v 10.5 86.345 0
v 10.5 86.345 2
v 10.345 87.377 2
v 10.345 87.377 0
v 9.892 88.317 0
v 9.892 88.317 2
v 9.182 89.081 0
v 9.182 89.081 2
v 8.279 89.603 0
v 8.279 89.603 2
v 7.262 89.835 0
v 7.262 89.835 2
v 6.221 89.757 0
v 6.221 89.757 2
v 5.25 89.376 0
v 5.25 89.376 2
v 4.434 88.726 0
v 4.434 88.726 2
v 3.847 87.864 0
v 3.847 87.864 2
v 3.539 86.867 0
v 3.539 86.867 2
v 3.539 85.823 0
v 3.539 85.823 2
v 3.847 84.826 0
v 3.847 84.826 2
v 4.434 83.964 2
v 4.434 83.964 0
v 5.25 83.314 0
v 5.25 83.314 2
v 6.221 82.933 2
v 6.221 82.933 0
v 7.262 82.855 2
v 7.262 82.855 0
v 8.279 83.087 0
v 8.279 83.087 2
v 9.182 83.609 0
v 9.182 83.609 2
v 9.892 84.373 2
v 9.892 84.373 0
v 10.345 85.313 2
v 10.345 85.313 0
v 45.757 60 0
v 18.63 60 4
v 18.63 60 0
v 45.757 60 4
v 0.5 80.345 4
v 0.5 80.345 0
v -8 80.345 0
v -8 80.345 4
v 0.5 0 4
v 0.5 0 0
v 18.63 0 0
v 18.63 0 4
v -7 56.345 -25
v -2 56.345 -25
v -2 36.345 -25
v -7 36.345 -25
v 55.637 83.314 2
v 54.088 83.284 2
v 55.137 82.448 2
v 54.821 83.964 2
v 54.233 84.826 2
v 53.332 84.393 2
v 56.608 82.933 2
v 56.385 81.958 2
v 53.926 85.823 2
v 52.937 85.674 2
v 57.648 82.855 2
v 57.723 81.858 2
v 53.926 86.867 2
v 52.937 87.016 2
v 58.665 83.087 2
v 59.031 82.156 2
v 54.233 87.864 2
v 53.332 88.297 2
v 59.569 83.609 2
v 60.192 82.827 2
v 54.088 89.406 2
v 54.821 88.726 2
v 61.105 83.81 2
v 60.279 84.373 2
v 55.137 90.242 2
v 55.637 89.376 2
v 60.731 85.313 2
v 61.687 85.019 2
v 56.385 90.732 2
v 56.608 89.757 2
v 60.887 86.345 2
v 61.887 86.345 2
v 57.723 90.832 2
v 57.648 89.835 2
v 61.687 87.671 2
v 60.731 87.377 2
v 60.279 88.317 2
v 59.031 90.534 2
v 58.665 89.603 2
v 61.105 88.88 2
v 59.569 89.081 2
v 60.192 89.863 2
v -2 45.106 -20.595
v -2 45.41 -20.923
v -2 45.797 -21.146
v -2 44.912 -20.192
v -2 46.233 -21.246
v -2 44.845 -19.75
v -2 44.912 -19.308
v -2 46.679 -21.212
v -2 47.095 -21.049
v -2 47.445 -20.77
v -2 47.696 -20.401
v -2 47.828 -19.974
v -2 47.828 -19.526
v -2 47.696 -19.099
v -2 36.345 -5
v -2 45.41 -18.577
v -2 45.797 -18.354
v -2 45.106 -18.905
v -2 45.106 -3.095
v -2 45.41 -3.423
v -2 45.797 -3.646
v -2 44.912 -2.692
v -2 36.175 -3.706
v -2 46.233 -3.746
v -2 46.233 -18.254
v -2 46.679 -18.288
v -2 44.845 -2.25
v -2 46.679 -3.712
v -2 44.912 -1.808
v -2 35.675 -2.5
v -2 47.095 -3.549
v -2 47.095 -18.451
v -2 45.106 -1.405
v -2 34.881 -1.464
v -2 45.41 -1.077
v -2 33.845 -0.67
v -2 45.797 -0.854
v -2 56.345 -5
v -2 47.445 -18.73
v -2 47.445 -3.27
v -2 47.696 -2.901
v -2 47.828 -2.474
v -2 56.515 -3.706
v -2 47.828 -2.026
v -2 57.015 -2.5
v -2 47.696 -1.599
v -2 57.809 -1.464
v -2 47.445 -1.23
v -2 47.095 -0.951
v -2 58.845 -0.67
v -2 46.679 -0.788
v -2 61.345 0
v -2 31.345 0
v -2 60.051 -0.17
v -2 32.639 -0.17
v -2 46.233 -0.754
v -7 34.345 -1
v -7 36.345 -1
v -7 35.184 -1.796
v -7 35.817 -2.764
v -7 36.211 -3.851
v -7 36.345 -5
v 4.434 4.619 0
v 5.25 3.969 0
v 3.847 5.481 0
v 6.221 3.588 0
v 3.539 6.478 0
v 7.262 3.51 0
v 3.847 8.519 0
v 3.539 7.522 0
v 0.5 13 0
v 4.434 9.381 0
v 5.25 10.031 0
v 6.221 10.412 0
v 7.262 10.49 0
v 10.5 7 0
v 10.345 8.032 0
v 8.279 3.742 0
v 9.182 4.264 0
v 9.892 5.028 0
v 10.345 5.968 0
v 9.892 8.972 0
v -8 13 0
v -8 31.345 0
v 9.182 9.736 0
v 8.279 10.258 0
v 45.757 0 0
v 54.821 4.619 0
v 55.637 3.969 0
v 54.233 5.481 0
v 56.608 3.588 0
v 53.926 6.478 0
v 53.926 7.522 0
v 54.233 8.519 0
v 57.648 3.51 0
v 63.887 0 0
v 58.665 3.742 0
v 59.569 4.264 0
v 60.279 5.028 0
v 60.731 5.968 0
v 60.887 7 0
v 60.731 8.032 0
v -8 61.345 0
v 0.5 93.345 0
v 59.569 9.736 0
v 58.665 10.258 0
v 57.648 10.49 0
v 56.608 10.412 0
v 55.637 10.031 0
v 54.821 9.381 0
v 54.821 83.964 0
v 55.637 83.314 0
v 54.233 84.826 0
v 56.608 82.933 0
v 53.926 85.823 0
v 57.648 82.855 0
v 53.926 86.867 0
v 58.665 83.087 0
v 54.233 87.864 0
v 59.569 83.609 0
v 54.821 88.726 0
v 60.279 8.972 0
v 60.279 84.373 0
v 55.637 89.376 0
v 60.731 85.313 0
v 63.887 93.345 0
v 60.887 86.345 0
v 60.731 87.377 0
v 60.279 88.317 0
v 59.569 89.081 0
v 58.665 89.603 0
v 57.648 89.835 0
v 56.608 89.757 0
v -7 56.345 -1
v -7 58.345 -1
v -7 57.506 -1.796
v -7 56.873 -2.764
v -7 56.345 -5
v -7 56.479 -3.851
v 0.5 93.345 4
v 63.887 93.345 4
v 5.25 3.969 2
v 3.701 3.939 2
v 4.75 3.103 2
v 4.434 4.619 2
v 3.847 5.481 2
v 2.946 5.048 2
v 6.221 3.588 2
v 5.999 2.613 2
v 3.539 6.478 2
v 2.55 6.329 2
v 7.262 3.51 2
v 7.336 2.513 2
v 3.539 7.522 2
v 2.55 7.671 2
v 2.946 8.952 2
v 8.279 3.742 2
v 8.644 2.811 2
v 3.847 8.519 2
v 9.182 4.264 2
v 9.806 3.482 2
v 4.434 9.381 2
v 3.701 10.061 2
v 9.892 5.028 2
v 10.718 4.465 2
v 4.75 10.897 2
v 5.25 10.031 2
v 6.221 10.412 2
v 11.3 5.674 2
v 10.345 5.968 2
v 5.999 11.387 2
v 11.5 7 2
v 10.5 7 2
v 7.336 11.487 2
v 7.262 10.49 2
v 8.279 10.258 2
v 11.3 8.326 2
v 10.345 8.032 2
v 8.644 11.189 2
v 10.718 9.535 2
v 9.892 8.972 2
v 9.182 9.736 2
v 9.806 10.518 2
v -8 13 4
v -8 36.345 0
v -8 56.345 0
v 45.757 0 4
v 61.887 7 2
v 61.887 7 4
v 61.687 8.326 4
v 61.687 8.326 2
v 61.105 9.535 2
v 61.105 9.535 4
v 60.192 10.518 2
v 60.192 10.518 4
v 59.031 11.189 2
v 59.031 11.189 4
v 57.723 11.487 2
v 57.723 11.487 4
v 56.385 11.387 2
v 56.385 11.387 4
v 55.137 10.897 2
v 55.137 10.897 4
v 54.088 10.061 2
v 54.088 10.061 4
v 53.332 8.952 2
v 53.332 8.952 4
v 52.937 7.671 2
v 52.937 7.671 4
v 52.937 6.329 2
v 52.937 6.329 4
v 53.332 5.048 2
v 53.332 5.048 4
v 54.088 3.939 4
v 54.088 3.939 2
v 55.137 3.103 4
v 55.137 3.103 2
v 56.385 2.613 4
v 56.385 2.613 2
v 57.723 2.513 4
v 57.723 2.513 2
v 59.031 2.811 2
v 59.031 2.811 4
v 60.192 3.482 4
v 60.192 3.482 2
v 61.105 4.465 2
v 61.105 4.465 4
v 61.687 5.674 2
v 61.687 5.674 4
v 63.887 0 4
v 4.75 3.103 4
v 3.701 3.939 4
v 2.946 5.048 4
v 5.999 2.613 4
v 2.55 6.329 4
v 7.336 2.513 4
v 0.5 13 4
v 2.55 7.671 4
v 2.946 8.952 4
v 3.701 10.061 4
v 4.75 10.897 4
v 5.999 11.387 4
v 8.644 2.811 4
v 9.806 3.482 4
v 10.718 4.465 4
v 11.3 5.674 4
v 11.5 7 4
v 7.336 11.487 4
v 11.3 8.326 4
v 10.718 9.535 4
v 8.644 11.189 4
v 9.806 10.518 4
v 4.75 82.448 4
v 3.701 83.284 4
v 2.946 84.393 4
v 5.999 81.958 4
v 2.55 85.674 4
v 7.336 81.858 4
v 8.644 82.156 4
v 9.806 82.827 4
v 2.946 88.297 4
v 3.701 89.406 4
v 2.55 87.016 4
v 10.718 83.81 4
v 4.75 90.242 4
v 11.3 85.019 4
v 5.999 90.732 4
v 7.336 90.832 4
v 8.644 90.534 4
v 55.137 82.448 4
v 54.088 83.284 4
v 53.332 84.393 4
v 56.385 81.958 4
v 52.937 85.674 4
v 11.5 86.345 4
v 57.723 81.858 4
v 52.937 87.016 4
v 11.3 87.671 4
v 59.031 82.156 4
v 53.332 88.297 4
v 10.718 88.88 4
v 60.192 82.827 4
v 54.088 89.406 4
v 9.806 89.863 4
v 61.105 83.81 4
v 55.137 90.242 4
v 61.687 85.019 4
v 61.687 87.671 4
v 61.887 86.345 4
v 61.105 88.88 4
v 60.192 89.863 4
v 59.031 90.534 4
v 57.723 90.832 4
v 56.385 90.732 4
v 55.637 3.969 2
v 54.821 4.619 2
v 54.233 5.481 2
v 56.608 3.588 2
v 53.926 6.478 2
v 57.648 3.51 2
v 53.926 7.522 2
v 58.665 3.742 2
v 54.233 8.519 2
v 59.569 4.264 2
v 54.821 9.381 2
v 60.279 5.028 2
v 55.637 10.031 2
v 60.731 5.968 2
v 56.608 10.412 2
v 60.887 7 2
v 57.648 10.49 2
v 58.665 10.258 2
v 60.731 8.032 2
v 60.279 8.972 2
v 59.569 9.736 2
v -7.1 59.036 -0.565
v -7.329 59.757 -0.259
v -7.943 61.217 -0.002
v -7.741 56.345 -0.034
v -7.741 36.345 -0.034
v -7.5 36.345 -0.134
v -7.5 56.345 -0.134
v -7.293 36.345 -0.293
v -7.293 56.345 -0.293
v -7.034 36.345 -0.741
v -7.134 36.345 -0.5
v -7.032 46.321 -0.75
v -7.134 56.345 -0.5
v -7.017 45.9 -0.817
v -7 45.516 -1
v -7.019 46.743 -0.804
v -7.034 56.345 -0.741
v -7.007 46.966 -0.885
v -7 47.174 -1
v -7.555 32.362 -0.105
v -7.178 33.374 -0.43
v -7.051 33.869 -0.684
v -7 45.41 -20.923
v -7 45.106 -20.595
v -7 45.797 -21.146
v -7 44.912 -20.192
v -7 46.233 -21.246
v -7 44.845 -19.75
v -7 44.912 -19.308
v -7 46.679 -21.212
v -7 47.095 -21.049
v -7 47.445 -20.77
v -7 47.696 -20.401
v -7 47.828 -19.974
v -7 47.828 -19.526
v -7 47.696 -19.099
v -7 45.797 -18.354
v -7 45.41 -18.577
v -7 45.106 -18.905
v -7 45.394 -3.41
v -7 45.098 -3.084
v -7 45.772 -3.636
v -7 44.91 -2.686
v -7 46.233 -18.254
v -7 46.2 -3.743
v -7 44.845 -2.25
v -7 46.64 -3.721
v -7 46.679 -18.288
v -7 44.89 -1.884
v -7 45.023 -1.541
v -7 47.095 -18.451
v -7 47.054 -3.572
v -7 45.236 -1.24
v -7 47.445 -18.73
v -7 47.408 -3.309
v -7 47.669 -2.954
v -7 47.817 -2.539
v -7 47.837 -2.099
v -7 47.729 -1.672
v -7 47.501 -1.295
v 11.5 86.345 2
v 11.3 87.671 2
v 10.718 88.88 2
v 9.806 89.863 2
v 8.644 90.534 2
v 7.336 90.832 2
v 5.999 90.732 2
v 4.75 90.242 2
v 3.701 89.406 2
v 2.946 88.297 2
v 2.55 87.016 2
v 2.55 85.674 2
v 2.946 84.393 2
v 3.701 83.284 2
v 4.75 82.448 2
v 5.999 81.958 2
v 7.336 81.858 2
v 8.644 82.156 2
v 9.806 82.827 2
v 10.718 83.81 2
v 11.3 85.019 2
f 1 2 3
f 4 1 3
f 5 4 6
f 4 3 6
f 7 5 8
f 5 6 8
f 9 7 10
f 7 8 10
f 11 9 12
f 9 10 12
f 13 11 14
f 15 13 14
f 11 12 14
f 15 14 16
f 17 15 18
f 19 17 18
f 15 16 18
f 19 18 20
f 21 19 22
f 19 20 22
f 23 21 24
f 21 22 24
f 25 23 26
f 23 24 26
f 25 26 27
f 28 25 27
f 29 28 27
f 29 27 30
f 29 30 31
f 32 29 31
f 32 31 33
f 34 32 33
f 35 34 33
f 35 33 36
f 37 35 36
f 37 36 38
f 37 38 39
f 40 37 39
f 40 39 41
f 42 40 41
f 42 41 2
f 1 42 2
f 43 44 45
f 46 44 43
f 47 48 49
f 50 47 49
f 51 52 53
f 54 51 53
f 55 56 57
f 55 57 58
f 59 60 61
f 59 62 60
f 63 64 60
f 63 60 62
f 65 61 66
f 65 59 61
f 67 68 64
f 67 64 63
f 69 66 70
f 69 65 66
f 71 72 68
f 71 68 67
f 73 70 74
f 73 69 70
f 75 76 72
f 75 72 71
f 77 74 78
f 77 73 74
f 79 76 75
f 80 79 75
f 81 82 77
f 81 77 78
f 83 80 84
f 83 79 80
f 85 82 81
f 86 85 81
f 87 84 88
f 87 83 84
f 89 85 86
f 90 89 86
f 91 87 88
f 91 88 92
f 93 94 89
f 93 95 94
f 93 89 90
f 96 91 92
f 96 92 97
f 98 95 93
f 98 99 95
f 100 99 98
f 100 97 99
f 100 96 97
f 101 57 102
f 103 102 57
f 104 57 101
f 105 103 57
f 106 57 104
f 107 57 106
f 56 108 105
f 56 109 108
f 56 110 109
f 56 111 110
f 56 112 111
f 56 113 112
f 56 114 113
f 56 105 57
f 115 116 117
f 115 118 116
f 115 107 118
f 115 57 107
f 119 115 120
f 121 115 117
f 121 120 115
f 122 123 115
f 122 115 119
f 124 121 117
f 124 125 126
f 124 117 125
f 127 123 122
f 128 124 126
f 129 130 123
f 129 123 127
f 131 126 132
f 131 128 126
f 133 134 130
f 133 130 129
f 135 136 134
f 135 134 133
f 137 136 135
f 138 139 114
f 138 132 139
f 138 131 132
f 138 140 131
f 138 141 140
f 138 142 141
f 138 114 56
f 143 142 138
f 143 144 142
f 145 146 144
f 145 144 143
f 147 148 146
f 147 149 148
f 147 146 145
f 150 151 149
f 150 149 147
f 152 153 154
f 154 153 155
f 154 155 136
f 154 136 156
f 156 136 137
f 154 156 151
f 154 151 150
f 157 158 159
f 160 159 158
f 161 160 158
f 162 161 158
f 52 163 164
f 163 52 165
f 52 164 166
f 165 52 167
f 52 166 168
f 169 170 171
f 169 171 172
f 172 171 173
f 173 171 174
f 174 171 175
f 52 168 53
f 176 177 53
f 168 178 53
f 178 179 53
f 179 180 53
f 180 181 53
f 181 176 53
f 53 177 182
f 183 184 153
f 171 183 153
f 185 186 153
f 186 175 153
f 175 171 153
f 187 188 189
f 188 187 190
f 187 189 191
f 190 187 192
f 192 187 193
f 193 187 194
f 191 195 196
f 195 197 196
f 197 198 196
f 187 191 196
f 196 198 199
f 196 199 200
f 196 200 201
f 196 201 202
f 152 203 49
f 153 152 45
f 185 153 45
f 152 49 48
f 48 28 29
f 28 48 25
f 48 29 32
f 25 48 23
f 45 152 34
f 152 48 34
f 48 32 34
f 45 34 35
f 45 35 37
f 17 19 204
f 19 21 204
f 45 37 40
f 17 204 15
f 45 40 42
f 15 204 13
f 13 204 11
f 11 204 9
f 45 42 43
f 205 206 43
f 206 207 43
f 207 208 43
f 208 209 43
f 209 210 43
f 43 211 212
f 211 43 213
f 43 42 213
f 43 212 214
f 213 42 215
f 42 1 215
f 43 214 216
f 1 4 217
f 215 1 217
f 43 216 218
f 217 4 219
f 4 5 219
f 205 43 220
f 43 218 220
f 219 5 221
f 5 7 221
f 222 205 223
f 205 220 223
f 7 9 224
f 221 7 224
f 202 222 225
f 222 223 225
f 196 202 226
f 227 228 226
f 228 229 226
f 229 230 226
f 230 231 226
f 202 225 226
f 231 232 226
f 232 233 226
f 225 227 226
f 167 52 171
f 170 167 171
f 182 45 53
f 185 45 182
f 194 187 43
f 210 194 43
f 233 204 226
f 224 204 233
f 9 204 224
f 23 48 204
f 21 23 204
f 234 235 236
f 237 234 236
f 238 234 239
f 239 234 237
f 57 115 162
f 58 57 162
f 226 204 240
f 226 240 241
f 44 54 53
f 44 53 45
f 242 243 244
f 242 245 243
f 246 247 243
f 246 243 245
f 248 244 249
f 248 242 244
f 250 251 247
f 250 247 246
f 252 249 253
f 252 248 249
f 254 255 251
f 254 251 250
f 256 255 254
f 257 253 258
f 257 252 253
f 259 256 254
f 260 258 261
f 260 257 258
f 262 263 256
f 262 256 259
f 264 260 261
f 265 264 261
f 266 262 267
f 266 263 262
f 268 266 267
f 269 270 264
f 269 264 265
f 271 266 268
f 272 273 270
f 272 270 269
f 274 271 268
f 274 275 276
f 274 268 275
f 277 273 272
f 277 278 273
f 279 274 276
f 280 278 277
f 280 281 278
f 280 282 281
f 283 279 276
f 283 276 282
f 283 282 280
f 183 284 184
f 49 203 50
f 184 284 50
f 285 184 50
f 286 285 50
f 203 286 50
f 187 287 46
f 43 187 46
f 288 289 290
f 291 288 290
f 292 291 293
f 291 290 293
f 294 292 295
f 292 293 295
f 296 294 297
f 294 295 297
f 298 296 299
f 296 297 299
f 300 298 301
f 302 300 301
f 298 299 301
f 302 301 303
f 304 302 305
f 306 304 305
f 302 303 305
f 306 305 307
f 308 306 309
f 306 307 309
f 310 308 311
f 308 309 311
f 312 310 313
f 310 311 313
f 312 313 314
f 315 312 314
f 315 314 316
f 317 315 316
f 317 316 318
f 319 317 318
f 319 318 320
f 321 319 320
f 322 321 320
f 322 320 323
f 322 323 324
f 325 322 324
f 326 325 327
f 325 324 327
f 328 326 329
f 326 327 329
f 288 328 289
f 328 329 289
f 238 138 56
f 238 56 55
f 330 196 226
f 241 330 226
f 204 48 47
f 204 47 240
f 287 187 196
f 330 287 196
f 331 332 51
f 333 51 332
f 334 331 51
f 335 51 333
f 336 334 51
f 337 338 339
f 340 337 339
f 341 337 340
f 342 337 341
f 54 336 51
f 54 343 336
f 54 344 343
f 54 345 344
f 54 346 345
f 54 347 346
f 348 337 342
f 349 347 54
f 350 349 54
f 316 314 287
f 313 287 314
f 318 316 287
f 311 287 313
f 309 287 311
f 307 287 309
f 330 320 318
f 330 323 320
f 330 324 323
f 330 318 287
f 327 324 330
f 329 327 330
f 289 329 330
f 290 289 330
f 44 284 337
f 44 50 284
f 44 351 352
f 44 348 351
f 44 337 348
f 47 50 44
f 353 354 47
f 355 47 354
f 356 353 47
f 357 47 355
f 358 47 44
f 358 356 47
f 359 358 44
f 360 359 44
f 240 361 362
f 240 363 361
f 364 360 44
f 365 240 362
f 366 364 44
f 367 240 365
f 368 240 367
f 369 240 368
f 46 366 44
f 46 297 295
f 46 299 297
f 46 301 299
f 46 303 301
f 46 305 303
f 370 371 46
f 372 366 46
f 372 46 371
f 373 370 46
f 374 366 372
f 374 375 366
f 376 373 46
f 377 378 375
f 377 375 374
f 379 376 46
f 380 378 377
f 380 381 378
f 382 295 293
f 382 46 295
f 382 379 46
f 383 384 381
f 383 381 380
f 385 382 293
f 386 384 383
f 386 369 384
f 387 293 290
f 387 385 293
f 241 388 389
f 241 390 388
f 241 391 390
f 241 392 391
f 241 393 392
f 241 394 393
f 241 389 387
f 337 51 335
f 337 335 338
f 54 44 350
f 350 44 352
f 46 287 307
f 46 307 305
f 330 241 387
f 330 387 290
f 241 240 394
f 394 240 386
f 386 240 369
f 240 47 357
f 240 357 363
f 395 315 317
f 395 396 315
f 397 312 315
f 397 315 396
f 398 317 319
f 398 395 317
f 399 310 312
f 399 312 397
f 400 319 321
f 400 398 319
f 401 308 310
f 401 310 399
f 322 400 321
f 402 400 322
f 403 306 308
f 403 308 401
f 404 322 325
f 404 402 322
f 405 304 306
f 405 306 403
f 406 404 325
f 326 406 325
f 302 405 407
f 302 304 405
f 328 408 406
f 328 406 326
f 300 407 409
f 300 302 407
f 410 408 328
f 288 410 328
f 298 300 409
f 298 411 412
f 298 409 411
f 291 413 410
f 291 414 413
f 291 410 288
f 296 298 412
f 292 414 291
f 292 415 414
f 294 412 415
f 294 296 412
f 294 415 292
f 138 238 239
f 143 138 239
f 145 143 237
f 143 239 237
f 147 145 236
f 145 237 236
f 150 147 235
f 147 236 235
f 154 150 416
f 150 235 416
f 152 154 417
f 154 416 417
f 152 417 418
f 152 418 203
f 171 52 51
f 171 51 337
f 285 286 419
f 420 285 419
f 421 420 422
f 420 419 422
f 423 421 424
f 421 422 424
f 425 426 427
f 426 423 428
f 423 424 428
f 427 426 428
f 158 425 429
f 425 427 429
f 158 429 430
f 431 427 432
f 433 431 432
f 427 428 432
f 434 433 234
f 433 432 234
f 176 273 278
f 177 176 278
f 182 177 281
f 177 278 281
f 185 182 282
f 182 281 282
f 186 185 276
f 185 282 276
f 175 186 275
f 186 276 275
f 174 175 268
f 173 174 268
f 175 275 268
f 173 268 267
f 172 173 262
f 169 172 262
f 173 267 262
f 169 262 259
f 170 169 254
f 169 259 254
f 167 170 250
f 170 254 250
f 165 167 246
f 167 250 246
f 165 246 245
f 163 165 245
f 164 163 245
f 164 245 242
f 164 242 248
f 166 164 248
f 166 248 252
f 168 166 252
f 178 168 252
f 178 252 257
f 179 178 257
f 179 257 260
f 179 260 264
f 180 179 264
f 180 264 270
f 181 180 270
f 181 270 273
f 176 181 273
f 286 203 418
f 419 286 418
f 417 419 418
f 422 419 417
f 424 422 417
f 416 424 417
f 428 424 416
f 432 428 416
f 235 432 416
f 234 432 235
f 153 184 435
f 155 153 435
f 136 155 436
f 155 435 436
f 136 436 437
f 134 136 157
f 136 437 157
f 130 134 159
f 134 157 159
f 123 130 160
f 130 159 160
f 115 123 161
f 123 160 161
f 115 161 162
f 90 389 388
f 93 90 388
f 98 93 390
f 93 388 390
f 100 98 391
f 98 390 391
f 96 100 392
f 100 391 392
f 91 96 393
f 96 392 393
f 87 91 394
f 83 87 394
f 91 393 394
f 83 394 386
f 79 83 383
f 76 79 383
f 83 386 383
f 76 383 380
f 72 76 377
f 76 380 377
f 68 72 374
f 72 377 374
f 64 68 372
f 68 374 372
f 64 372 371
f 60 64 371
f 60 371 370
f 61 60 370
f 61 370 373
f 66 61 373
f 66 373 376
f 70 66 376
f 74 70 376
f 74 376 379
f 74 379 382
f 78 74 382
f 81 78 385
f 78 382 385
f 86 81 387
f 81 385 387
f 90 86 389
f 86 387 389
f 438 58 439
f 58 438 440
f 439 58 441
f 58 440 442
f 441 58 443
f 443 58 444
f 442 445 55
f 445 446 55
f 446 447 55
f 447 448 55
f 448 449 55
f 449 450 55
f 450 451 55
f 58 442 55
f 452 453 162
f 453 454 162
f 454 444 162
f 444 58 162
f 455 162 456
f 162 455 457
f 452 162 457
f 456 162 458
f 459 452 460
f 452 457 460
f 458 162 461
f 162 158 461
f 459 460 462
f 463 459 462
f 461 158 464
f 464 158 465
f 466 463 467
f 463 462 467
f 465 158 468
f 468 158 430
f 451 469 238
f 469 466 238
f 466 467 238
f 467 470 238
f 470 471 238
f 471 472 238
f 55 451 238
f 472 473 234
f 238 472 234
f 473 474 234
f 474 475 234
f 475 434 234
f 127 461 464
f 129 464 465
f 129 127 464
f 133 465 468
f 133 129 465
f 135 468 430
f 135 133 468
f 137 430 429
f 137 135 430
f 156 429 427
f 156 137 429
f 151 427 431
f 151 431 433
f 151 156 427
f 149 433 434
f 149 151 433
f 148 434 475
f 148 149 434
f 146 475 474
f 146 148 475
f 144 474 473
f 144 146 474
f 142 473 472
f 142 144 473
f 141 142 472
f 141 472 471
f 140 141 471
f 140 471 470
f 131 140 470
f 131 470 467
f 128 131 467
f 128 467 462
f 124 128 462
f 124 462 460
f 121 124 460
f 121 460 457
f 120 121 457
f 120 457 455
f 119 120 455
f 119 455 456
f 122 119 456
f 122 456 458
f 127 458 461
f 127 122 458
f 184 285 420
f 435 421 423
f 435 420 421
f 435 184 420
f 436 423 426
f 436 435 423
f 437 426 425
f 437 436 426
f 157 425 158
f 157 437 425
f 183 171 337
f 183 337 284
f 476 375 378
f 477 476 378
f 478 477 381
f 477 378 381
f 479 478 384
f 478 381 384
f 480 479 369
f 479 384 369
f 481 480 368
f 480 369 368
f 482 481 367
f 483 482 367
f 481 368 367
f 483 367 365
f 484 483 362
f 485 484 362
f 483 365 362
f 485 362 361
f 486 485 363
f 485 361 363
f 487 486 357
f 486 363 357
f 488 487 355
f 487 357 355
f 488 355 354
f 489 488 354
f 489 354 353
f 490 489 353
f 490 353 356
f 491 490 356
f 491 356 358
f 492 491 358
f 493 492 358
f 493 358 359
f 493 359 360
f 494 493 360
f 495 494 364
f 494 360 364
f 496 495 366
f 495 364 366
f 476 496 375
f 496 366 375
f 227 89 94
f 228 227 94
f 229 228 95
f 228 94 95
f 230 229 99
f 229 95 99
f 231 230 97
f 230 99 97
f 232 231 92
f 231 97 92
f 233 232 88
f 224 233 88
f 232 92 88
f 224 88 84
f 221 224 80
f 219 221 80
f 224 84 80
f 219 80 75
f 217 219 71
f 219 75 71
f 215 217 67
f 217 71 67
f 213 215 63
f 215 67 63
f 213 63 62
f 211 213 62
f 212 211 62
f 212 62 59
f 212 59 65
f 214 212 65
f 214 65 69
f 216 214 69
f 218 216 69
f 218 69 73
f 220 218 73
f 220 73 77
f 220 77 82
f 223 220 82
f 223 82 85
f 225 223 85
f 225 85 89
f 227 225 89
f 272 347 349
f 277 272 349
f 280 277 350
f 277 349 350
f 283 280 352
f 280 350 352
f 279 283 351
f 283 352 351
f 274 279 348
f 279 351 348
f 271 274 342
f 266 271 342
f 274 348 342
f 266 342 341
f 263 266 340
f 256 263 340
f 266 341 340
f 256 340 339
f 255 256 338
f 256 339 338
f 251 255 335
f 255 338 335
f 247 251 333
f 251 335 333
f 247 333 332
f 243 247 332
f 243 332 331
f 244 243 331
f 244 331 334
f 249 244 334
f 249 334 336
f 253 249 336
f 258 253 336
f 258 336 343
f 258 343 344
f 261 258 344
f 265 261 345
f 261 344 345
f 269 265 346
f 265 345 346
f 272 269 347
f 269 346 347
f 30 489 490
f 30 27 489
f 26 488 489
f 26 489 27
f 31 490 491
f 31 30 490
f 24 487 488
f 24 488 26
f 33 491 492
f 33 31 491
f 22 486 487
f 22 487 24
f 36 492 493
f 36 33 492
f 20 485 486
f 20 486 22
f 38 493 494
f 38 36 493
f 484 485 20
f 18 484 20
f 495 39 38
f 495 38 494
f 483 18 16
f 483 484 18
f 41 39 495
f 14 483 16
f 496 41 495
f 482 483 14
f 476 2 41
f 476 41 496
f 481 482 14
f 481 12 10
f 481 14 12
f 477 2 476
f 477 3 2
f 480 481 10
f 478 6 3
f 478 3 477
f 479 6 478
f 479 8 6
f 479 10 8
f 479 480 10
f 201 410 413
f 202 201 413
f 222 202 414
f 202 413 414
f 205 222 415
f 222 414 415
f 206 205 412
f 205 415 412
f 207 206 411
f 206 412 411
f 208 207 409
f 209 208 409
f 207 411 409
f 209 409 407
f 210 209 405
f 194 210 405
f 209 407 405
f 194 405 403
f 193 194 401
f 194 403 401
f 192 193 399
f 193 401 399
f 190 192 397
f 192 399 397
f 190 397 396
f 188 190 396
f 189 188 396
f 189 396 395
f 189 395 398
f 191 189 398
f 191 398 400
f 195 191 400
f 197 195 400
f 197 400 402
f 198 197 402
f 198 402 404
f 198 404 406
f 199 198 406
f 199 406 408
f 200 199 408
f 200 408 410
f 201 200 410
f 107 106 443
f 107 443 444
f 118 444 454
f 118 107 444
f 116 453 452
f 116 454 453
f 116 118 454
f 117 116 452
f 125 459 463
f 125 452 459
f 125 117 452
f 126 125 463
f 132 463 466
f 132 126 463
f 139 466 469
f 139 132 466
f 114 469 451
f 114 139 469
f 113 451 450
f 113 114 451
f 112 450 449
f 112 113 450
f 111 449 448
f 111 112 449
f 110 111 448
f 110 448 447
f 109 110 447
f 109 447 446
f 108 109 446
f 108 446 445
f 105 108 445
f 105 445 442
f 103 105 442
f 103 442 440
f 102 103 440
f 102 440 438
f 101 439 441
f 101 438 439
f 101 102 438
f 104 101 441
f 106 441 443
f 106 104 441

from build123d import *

# Parameters (mm, degrees)
CROQUIS1_W                 = 64.38677758
CROQUIS1_H                 = 93.345
SALIENTE_EXTRUIR1_DEPTH    = 4
CROQUIS2_W                 = 27.12677758
CROQUIS2_H                 = 60
CORTAR_EXTRUIR1_DEPTH      = 114.467819897
CROQUIS5_R                 = 4.5
CORTAR_EXTRUIR3_DEPTH      = 2
CROQUIS6_R                 = 3.5
CORTAR_EXTRUIR4_DEPTH      = 114.414929141
CROQUIS7_W                 = 8
CROQUIS7_H                 = 67.345
SALIENTE_EXTRUIR4_DEPTH    = 4
CROQUIS8_W                 = 26.63
CROQUIS8_H                 = 67.345
SALIENTE_EXTRUIR5_DEPTH    = 2
CROQUIS9_W                 = 0.5
CROQUIS9_H                 = 93.345
CROQUIS9_H_2               = 13
CORTAR_EXTRUIR5_DEPTH      = 13
CROQUIS10_W                = 5
CROQUIS10_H                = 20
SALIENTE_EXTRUIR6_DEPTH    = 25
REDONDEO1_R                = 1
REDONDEO2_START            = -8.0000001
REDONDEO2_DEPTH            = 6.0000001
REDONDEO2_START_2          = 13
REDONDEO2_2_DEPTH          = 67.345
CORTAR_EXTRUIR6_DEPTH      = 120.846669794
CORTAR_EXTRUIR6_DEPTH_BACK = 120.846669794
CROQUIS11_R                = 1.5


with BuildPart() as part:
    # Croquis1 → Saliente-Extruir1 (new body)
    with BuildSketch(Plane.XY):
        with Locations((32.19338879, 46.6725)):
            Rectangle(CROQUIS1_W, CROQUIS1_H)
    extrude(amount=SALIENTE_EXTRUIR1_DEPTH)

    # Croquis2 → Cortar-Extruir1 (cut, through all)
    with BuildSketch(Plane.XY.offset(4)):
        with Locations((32.19338879, 30)):
            Rectangle(CROQUIS2_W, CROQUIS2_H)
    extrude(amount=-CORTAR_EXTRUIR1_DEPTH, mode=Mode.SUBTRACT)

    # Croquis5 → Cortar-Extruir3 (cut)
    with BuildSketch(Plane.XY.offset(4)):
        with Locations((57.38677758, 86.345)):
            Circle(CROQUIS5_R)
        with Locations((7, 86.345)):
            Circle(CROQUIS5_R)
        with Locations((57.38677758, 7)):
            Circle(CROQUIS5_R)
        with Locations((7, 7)):
            Circle(CROQUIS5_R)
    extrude(amount=-CORTAR_EXTRUIR3_DEPTH, mode=Mode.SUBTRACT)

    # Croquis6 → Cortar-Extruir4 (cut, through all)
    with BuildSketch(Plane.XY.offset(2)):
        with Locations((7, 86.345)):
            Circle(CROQUIS6_R)
        with Locations((57.38677758, 86.345)):
            Circle(CROQUIS6_R)
        with Locations((57.38677758, 7)):
            Circle(CROQUIS6_R)
        with Locations((7, 7)):
            Circle(CROQUIS6_R)
    extrude(amount=-CORTAR_EXTRUIR4_DEPTH, mode=Mode.SUBTRACT)

    # Croquis7 → Saliente-Extruir4 (add, through all)
    with BuildSketch(Plane(origin=(0, 0, 0), x_dir=(-1, 0, 0), z_dir=(0, 0, -1))):
        with Locations((4, 46.6725)):
            Rectangle(CROQUIS7_W, CROQUIS7_H)
    extrude(amount=-SALIENTE_EXTRUIR4_DEPTH)

    # Croquis8 → Saliente-Extruir5 (add)
    with BuildSketch(Plane(origin=(0, 0, 0), x_dir=(-1, 0, 0), z_dir=(0, 0, -1))):
        with Locations((-5.315, 46.6725)):
            Rectangle(CROQUIS8_W, CROQUIS8_H)
    extrude(amount=-SALIENTE_EXTRUIR5_DEPTH)

    # Croquis9 → Cortar-Extruir5 (cut)
    with BuildSketch(Plane(origin=(0, 0, 0), x_dir=(-1, 0, 0), z_dir=(0, 0, -1))):
        with Locations((-64.13677758, 46.6725)):
            Rectangle(CROQUIS9_W, CROQUIS9_H)
        with Locations((-0.25, 86.845)):
            Rectangle(CROQUIS9_W, CROQUIS9_H_2)
        with Locations((-0.25, 6.5)):
            Rectangle(CROQUIS9_W, CROQUIS9_H_2)
    extrude(amount=-CORTAR_EXTRUIR5_DEPTH, mode=Mode.SUBTRACT)

    # Croquis10 → Saliente-Extruir6 (add)
    with BuildSketch(Plane(origin=(0, 0, 0), x_dir=(-1, 0, 0), z_dir=(0, 0, -1))):
        with Locations((4.5, 46.345)):
            Rectangle(CROQUIS10_W, CROQUIS10_H)
    extrude(amount=SALIENTE_EXTRUIR6_DEPTH)

    # Redondeo1
    redondeo1_edges = [part.edges().sort_by_distance(p)[0] for p in [
        (-7, 46.345, 0),
    ]]
    fillet(redondeo1_edges, radius=REDONDEO1_R - 0.0001)  # a hair under: the kernel refuses the full size

    # Redondeo2: read off the stored shape, not the designer's step
    # Redondeo2 outline → Redondeo2 (add)
    with BuildSketch(Plane.YZ.offset(REDONDEO2_START)):
        with BuildLine():
            Line((56.345, 0), (56.345, -5))
            ThreePointArc((56.345, -5), (57.809466094, -1.464466094), (61.345, 0))
            Line((61.345, 0), (56.345, 0))
        make_face()
        with BuildLine():
            Line((36.345, -5), (36.345, 0))
            Line((36.345, 0), (31.345, 0))
            ThreePointArc((31.345, 0), (34.880533906, -1.464466094), (36.345, -5))
        make_face()
    extrude(amount=REDONDEO2_DEPTH)

    # Redondeo2 2 outline → Redondeo2 2 (cut)
    with BuildSketch(Plane(origin=(0, 0, 0), x_dir=(1, 0, 0), z_dir=(0, 1, 0)).offset(REDONDEO2_START_2)):
        with BuildLine():
            ThreePointArc((-8, 0), (-7.292893219, 0.292893219), (-7, 1))
            Line((-7, 1), (-6.999999997, 6))
            Line((-6.999999997, 6), (-8, 6))
            Line((-8, 6), (-8, 0))
        make_face()
    extrude(amount=REDONDEO2_2_DEPTH, mode=Mode.SUBTRACT)

    # Croquis11 → Cortar-Extruir6 (cut, two sides: drawn at the far end of the back side and taken through both)
    with BuildSketch(Plane.ZY.offset(7).offset(-CORTAR_EXTRUIR6_DEPTH_BACK)):
        with Locations(Location((-19.75, 46.345, 0), (0, 0, 270))):
            Circle(CROQUIS11_R)
        with Locations(Location((-2.25, 46.345, 0), (0, 0, 270))):
            Circle(CROQUIS11_R)
    extrude(amount=CORTAR_EXTRUIR6_DEPTH + CORTAR_EXTRUIR6_DEPTH_BACK, mode=Mode.SUBTRACT)


solid = part.part
